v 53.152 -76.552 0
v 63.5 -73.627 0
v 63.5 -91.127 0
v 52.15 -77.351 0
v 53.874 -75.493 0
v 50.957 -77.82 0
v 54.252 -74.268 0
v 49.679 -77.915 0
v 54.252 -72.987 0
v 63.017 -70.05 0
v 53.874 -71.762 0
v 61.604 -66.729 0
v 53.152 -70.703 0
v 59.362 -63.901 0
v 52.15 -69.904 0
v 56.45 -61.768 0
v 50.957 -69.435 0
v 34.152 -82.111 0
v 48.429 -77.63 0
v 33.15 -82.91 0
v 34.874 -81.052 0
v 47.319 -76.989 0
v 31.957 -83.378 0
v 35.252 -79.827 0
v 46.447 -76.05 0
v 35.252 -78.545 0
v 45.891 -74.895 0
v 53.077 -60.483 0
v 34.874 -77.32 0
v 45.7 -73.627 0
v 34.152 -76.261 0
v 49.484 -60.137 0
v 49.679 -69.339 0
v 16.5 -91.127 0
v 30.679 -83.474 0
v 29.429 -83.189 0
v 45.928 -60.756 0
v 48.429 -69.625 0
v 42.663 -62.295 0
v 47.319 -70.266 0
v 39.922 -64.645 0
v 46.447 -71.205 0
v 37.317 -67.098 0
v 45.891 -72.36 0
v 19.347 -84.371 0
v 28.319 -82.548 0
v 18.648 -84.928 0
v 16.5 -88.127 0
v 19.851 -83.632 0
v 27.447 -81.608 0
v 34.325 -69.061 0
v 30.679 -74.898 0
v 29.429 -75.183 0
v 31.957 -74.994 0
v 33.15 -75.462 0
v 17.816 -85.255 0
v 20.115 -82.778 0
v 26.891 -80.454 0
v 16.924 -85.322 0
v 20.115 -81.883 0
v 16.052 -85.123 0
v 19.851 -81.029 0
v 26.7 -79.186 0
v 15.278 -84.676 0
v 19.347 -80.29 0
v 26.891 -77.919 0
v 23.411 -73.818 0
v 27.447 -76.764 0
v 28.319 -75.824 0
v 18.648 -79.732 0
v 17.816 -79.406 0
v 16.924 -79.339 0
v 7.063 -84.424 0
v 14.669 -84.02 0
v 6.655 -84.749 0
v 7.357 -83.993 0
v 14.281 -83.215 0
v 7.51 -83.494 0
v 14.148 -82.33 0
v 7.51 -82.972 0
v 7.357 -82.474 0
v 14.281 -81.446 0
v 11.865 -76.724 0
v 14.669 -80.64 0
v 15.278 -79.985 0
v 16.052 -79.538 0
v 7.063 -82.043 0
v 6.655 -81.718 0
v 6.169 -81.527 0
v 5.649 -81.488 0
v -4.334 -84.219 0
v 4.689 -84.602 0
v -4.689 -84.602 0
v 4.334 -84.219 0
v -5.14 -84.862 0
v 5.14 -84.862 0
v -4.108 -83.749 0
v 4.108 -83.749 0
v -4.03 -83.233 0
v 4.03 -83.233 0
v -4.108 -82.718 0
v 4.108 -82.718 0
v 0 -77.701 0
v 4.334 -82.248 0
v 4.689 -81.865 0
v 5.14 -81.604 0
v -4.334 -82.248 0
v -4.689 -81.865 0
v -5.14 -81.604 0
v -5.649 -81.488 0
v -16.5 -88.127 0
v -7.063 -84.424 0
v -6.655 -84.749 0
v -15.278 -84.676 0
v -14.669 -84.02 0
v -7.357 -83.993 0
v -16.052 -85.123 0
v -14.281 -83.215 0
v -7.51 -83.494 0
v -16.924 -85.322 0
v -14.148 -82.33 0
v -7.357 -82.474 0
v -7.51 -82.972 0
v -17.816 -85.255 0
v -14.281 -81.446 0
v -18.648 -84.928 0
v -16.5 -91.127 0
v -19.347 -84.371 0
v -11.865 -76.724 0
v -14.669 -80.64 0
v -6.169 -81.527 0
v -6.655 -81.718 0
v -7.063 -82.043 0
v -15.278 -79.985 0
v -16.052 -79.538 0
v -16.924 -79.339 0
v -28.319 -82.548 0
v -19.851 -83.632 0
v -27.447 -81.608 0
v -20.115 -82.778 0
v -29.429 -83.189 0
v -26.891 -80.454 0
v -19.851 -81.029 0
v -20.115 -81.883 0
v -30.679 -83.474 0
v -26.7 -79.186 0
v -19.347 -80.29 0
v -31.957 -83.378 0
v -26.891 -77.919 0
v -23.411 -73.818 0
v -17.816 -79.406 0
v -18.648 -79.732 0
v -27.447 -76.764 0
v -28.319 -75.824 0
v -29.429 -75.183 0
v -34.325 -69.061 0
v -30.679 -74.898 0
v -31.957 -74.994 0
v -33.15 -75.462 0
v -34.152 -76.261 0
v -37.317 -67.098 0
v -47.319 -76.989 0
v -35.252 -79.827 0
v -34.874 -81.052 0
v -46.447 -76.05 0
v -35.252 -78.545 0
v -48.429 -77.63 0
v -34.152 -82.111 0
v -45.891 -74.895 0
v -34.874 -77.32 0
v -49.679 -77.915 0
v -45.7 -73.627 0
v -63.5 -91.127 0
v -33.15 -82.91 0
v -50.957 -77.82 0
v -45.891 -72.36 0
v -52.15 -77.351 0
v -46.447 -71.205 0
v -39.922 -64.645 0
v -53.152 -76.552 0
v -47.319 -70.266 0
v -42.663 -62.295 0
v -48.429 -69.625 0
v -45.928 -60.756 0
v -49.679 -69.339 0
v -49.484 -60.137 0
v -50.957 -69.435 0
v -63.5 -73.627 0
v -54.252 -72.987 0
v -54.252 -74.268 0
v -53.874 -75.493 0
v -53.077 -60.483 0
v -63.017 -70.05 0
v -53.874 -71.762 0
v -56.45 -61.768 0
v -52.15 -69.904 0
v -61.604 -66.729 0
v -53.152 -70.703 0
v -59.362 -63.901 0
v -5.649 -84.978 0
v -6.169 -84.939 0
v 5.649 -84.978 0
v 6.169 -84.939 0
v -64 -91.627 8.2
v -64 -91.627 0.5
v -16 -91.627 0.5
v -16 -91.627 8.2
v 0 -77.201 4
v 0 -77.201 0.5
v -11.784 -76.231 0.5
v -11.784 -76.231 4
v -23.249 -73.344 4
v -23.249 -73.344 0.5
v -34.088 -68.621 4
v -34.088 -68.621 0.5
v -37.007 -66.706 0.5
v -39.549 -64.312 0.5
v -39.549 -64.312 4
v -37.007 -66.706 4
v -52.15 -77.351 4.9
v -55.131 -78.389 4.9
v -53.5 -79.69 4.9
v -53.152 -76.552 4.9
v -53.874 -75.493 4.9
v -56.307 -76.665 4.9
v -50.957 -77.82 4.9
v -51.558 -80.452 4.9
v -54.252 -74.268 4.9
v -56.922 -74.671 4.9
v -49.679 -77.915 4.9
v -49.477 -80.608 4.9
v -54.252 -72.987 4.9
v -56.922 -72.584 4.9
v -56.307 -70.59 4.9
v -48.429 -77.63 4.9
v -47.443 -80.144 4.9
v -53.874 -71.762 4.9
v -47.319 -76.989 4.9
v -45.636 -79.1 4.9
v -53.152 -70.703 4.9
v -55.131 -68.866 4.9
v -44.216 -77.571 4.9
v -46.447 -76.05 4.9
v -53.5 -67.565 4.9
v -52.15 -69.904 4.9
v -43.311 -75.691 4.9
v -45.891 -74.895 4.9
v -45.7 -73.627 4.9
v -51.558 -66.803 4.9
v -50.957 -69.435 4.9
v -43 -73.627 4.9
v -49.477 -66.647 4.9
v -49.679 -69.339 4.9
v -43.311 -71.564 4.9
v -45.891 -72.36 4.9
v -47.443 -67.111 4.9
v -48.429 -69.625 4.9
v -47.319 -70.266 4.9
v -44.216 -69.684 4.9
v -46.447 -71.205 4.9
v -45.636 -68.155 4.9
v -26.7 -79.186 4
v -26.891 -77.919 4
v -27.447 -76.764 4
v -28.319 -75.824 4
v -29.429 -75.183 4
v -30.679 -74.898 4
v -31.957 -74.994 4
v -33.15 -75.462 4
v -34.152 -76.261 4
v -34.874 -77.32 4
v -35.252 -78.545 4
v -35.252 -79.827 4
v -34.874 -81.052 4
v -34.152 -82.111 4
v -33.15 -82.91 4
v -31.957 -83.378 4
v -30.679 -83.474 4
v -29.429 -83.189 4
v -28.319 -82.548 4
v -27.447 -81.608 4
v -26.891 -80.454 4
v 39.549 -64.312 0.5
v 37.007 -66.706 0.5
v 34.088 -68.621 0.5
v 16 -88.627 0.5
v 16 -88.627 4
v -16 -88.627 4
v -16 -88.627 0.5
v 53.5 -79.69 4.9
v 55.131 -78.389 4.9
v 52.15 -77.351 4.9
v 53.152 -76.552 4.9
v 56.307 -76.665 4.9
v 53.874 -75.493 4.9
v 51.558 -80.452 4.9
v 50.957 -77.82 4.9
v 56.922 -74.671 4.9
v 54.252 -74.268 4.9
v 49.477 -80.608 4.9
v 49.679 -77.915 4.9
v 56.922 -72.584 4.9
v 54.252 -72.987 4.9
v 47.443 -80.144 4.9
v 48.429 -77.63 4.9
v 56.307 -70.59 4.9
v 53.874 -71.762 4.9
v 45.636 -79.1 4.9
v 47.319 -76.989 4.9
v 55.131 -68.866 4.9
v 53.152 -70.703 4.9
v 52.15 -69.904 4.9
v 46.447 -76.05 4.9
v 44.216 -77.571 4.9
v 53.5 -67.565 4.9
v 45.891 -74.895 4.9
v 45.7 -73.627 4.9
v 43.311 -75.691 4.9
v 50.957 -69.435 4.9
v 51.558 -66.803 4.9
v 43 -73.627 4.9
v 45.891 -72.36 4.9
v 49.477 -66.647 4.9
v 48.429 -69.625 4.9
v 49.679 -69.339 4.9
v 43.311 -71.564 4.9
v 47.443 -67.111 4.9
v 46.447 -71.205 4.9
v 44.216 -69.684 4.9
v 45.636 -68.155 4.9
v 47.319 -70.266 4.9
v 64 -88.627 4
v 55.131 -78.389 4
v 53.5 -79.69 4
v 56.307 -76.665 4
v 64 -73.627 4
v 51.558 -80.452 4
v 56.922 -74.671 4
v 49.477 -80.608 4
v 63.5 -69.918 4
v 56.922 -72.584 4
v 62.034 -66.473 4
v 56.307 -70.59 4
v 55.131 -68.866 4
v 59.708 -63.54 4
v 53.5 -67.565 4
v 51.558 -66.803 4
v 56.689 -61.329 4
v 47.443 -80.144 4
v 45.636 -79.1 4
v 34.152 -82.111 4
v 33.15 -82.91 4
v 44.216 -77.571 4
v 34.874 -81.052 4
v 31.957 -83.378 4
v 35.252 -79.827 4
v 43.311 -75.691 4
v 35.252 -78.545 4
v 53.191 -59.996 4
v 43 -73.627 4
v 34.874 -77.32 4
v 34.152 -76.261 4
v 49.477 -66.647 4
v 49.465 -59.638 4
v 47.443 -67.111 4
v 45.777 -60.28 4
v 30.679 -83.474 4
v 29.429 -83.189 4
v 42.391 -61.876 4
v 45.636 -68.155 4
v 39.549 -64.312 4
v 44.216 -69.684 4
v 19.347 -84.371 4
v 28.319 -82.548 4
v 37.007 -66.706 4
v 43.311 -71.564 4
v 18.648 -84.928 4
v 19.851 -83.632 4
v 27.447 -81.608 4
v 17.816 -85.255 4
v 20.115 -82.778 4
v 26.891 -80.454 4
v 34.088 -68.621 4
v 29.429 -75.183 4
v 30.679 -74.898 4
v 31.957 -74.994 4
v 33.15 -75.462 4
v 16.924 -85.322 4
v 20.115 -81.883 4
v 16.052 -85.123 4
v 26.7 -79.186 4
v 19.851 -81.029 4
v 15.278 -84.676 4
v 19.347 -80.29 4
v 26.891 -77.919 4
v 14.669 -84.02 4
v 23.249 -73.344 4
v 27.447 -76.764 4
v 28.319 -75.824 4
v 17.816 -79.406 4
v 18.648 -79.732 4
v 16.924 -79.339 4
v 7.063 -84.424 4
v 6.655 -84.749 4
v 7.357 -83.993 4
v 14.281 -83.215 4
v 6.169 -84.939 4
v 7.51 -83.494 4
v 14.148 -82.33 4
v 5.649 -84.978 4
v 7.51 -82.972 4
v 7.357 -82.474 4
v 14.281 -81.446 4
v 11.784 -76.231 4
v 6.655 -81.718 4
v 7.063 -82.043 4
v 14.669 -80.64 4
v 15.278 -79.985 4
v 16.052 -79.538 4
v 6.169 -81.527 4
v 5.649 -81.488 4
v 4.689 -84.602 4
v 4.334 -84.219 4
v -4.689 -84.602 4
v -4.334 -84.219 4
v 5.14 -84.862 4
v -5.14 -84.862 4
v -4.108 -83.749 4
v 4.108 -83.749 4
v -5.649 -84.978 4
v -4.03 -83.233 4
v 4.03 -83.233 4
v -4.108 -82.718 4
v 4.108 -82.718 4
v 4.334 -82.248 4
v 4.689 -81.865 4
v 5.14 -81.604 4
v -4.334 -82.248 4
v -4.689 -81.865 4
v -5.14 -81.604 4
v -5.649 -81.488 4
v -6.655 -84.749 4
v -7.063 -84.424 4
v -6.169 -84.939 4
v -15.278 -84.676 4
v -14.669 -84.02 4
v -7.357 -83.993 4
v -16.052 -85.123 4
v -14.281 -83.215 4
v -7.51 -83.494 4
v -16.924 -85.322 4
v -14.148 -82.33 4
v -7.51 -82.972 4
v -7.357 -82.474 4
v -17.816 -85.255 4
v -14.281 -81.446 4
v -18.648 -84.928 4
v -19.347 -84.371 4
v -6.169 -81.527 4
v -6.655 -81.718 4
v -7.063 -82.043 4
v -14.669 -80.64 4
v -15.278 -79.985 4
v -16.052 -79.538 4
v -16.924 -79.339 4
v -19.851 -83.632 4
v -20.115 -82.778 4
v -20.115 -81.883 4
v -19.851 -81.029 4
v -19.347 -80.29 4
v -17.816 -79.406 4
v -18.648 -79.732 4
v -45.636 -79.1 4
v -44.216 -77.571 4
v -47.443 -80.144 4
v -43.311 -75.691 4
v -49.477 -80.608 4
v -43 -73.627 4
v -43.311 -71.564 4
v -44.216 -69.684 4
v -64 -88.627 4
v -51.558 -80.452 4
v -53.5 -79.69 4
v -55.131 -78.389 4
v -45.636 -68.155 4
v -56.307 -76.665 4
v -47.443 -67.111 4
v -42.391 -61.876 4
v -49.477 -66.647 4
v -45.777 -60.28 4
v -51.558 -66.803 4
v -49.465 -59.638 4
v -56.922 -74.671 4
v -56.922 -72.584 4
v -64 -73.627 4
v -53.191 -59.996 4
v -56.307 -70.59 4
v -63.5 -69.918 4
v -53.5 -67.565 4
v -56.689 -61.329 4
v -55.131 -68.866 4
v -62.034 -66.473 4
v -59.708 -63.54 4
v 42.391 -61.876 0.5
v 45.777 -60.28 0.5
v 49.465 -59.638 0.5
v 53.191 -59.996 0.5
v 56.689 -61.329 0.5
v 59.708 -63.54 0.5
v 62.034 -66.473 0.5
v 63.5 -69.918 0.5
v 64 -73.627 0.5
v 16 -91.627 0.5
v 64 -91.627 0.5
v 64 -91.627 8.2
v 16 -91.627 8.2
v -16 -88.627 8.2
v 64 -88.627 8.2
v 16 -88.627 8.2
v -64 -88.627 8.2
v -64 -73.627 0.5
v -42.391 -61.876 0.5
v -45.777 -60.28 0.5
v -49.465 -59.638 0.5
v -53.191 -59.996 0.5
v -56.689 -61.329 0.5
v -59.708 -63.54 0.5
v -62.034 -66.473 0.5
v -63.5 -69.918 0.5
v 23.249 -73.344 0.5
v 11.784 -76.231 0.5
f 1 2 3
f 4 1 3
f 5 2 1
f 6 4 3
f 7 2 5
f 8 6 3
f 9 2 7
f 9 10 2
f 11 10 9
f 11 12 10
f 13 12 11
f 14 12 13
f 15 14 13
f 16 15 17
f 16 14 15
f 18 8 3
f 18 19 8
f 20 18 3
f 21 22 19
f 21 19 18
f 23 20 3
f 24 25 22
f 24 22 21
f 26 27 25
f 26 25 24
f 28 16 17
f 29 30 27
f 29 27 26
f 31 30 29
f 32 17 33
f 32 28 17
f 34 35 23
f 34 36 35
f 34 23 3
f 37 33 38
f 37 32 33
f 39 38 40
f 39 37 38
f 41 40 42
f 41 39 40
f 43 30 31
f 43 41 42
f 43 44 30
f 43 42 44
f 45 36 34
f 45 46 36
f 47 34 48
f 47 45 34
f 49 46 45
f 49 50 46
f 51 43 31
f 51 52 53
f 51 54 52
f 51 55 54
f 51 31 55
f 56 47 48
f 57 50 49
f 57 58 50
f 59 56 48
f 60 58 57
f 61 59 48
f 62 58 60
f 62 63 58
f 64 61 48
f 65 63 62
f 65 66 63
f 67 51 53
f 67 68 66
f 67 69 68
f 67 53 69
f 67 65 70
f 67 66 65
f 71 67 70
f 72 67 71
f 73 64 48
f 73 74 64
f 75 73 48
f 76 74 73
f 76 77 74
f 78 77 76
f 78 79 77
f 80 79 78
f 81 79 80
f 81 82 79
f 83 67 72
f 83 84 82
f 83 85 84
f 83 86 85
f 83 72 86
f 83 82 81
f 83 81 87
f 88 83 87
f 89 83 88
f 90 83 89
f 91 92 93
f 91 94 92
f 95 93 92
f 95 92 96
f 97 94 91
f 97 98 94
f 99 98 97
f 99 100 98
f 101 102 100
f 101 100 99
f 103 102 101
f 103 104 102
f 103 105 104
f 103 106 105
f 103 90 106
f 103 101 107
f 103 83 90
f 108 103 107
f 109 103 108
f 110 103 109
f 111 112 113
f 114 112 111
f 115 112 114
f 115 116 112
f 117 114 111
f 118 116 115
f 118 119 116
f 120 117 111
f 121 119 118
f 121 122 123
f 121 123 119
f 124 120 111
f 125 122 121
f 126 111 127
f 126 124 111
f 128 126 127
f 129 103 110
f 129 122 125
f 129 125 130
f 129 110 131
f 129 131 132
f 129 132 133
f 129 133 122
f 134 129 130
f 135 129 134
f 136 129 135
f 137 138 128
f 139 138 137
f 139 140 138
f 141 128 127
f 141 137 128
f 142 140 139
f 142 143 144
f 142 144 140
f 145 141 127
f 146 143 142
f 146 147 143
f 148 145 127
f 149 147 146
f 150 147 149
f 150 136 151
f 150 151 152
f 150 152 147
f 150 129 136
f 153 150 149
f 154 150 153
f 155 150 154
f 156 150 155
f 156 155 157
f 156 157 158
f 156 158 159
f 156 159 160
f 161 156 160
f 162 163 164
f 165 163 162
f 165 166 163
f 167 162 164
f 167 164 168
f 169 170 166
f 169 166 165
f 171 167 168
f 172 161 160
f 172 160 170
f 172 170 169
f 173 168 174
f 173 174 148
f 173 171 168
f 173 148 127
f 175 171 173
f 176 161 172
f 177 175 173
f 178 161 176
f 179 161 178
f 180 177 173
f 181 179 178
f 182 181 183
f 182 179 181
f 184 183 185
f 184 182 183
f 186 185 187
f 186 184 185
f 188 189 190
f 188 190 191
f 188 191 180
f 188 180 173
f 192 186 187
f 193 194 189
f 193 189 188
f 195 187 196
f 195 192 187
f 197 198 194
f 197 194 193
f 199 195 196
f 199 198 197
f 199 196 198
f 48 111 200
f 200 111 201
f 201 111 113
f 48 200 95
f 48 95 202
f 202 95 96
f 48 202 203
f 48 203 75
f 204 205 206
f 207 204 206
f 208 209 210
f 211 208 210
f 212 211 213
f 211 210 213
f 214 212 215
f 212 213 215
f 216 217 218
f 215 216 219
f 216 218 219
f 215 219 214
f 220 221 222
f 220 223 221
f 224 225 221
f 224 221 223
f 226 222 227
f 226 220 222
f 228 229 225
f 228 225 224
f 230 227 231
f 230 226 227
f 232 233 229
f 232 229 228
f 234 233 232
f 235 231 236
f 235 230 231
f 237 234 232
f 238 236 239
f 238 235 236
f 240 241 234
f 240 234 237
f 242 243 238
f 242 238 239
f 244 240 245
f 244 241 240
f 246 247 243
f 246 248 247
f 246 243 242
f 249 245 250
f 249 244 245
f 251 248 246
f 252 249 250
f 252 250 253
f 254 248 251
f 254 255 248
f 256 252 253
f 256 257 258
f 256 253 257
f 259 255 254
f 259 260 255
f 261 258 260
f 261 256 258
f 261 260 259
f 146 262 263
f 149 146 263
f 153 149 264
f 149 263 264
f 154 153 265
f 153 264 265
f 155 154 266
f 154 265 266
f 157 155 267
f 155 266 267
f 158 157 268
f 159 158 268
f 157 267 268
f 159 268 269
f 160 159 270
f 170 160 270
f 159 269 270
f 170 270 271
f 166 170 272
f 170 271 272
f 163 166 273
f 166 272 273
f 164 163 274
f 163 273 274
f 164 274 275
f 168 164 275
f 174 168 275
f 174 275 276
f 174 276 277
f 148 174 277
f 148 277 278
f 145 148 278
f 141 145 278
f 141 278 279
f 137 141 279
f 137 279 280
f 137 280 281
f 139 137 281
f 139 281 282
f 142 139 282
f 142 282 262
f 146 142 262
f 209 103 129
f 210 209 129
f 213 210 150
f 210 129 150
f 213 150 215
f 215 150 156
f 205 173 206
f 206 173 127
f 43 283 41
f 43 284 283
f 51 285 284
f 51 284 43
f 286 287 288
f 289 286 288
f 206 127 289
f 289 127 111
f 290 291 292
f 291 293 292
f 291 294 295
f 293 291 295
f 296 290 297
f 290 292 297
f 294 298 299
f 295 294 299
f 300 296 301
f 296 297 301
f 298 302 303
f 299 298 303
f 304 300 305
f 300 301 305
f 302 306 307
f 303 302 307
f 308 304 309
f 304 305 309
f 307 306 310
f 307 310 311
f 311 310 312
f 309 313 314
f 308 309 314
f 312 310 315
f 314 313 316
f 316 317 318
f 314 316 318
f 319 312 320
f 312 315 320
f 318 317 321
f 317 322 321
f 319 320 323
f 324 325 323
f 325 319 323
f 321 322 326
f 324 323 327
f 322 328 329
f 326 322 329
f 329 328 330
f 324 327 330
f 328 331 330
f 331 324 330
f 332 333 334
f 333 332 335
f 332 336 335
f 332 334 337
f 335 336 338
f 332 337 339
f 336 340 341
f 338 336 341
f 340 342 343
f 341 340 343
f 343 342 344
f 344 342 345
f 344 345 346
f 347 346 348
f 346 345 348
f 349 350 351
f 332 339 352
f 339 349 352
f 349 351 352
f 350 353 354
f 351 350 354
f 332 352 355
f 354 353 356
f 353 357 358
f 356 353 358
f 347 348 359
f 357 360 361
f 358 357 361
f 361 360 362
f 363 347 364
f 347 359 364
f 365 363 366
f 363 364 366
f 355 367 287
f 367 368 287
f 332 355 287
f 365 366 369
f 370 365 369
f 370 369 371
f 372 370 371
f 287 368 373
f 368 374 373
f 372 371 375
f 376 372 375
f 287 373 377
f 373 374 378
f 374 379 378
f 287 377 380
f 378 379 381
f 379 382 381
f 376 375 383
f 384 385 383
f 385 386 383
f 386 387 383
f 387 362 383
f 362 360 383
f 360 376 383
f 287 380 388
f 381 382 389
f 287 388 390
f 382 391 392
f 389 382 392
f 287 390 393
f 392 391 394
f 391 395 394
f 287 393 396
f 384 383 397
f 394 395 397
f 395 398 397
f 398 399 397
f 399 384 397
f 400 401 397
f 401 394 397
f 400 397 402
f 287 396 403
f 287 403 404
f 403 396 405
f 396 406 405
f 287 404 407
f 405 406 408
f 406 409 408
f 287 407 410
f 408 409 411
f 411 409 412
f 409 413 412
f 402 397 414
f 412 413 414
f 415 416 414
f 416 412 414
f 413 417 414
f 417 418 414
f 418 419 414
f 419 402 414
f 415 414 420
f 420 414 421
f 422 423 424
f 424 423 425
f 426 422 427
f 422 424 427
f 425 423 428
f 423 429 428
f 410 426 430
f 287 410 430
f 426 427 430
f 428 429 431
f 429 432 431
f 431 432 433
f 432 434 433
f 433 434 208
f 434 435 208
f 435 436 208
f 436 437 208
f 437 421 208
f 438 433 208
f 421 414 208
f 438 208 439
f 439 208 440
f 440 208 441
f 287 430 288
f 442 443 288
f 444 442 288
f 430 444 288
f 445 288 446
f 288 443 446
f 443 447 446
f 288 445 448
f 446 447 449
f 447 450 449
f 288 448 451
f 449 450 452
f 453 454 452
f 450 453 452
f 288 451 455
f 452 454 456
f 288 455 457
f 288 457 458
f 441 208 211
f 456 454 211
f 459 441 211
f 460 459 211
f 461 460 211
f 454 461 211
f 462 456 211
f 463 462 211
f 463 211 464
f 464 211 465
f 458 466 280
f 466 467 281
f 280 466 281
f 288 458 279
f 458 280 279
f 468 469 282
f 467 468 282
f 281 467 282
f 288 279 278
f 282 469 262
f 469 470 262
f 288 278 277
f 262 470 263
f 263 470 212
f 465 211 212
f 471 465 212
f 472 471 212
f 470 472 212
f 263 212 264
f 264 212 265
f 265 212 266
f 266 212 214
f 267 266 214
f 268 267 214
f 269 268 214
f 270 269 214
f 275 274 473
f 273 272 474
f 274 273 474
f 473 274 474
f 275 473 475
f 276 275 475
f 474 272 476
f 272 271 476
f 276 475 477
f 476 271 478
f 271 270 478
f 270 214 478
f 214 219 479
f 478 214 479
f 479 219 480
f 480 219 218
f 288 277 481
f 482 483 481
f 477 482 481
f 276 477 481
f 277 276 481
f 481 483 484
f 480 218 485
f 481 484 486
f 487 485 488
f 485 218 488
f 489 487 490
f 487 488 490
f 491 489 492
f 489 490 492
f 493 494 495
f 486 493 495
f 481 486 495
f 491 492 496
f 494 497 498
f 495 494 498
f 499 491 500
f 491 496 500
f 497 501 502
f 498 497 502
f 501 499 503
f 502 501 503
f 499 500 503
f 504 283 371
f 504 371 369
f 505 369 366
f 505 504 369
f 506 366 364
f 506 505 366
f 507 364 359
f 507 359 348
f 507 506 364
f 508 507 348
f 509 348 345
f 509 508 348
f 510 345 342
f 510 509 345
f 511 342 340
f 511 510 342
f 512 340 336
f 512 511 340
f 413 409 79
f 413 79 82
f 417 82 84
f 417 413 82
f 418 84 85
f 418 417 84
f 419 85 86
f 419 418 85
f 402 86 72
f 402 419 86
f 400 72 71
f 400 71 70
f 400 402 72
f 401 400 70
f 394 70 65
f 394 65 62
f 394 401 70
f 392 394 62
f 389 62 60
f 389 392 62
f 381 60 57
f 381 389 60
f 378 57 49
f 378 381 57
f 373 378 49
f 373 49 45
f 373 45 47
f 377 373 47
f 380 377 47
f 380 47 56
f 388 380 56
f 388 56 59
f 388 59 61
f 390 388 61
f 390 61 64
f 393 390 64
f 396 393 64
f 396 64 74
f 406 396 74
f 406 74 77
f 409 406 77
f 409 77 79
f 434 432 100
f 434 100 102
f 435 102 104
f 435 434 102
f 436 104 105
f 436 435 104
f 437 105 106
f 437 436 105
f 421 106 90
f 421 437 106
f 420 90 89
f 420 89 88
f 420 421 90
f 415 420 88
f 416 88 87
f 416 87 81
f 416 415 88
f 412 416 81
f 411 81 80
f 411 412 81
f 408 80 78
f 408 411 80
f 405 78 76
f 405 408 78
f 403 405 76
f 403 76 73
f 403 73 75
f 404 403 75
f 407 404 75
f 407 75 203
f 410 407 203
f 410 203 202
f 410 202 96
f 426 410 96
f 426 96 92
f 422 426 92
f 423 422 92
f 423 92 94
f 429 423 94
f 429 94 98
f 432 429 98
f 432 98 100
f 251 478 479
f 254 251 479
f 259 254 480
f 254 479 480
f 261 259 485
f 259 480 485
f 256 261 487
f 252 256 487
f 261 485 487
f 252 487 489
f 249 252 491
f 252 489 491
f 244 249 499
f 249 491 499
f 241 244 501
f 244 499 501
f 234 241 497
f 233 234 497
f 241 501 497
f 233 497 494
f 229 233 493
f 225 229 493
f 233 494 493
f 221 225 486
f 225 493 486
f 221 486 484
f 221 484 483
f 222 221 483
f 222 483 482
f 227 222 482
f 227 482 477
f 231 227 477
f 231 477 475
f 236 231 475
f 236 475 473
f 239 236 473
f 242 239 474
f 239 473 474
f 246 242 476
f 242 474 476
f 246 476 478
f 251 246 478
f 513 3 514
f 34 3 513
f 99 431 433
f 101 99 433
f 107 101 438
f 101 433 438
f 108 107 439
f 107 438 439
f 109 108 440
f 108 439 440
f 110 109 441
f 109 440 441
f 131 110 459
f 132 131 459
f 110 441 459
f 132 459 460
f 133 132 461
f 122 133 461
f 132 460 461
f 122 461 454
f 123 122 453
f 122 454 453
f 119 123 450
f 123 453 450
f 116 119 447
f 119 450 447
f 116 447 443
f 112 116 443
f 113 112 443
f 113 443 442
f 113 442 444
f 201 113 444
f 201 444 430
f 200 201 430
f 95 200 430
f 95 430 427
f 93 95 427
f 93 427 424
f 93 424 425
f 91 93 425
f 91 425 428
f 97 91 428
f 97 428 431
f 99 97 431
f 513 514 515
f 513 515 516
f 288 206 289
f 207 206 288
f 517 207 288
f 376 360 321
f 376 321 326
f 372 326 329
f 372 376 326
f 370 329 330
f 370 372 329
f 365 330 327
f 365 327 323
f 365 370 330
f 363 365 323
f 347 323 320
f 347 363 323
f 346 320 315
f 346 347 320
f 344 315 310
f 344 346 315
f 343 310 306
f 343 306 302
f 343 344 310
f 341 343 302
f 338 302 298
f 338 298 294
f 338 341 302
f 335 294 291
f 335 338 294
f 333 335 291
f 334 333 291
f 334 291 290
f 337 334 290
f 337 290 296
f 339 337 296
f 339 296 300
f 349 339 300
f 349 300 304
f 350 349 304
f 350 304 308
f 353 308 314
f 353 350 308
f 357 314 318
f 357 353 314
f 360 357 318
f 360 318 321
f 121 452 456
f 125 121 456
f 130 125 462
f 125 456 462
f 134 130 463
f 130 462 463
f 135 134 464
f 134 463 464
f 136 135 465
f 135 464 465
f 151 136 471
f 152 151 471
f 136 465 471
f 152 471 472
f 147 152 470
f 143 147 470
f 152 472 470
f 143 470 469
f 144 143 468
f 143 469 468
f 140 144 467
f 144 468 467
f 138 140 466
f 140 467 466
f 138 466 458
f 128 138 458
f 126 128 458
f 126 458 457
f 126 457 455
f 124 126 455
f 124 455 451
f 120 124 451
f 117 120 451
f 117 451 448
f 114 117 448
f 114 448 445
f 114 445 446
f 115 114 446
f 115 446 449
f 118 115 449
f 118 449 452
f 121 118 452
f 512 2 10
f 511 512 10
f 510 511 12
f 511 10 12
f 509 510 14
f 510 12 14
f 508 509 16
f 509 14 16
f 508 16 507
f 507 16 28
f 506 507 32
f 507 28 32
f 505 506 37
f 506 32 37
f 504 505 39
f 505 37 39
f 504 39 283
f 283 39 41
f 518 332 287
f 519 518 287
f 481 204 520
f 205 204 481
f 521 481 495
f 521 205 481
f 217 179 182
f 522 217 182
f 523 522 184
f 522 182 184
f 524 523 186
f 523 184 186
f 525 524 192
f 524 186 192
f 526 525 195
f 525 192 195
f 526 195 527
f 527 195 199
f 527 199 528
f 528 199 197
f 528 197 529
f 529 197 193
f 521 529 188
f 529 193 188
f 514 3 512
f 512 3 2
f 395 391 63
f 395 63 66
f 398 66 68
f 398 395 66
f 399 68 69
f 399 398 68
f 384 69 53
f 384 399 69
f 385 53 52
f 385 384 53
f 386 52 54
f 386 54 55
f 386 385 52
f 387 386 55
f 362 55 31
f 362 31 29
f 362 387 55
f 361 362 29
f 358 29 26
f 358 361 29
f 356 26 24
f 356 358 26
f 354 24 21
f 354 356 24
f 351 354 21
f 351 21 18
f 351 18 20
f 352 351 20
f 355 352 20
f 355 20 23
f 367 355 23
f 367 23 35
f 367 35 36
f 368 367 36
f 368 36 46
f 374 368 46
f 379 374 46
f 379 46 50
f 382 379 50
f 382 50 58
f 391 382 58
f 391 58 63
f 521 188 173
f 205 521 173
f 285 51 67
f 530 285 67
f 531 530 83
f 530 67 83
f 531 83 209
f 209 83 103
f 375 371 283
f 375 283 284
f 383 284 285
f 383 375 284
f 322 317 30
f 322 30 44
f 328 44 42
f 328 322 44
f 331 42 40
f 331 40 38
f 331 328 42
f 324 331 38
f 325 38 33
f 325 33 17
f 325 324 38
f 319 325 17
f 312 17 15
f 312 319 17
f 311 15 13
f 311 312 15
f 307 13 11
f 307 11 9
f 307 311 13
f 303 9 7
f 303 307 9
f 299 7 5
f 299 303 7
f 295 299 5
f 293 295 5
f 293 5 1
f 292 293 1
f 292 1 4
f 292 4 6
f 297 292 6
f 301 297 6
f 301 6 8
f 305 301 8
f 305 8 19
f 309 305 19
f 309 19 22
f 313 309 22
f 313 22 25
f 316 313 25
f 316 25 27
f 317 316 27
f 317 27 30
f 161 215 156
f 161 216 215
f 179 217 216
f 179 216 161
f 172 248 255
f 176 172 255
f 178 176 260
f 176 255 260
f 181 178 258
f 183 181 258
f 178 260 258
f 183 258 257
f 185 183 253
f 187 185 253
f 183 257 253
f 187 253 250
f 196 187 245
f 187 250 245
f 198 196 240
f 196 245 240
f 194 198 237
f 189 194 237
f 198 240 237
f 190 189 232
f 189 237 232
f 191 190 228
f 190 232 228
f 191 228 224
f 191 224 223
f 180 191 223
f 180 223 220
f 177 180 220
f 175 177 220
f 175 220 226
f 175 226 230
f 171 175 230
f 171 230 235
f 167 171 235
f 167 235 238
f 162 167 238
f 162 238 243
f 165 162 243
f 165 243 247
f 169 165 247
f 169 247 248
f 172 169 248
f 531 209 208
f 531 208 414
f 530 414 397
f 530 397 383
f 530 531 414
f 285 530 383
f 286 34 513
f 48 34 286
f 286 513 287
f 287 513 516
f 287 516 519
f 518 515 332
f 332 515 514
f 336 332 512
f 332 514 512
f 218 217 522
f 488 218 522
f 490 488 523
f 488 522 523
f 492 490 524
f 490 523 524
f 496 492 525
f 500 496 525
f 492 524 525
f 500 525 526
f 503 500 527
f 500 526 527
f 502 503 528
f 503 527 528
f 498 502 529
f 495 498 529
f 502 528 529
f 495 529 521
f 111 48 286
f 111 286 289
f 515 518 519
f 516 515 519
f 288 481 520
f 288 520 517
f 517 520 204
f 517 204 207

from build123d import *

# Parameters (mm, degrees)
BOSS_EXTRUDE1_DEPTH = 4
SKETCH6_R           = 7
BOSS_EXTRUDE2_DEPTH = 0.9
SKETCH7_R           = 4.3
CUT_EXTRUDE1_DEPTH  = 20
FILLET1_R           = 20
SKETCH8_W           = 64
SKETCH8_H           = 3
BOSS_EXTRUDE3_DEPTH = 4.2
SKETCH10_W          = 16
SKETCH10_H          = 3
CUT_EXTRUDE2_DEPTH  = 20
SKETCH11_R          = 4.3
SKETCH11_R_2        = 3
SKETCH11_R_3        = 1.75
CUT_EXTRUDE3_DEPTH  = 20
CHAMFER1_SIZE       = 0.5


with BuildPart() as part:
    # Sketch3 → Boss-Extrude1 (new body)
    with BuildSketch(Plane.XY):
        with BuildLine():
            Line((-64, -73.627440537), (-64, -91.627440537))
            Line((-64, -91.627440537), (0, -91.627440537))
            Line((0, -91.627440537), (0, -77.201334505))
            ThreePointArc((0, -77.201334505), (-19.791335437, -74.427796509), (-38.057892518, -66.320863438))
            ThreePointArc((-38.057892518, -66.320863438), (-53.795424565, -60.15173082), (-64, -73.627440537))
        make_face()
    extrude(amount=BOSS_EXTRUDE1_DEPTH)

    # Sketch6 → Boss-Extrude2 (add)
    with BuildSketch(Plane.XY.offset(4)):
        with Locations((-50, -73.627440537)):
            Circle(SKETCH6_R)
    extrude(amount=BOSS_EXTRUDE2_DEPTH)

    # Sketch7 → Cut-Extrude1 (cut)
    with BuildSketch(Plane.XY.offset(4.9)):
        with Locations((-50, -73.627440537)):
            Circle(SKETCH7_R)
    extrude(amount=-CUT_EXTRUDE1_DEPTH, mode=Mode.SUBTRACT)

    # Fillet1
    fillet1_edges = [part.edges().sort_by_distance(p)[0] for p in [
        (-38.057892518, -66.320863438, 2),
    ]]
    fillet(fillet1_edges, radius=FILLET1_R)

    # Sketch8 → Boss-Extrude3 (add)
    with BuildSketch(Plane.XY.offset(4)):
        with Locations((-32, -90.127440537)):
            Rectangle(SKETCH8_W, SKETCH8_H)
    extrude(amount=BOSS_EXTRUDE3_DEPTH)

    # Sketch10 → Cut-Extrude2 (cut)
    with BuildSketch(Plane.XY.offset(8.2)):
        with Locations((-8, -90.127440537)):
            Rectangle(SKETCH10_W, SKETCH10_H)
    extrude(amount=-CUT_EXTRUDE2_DEPTH, mode=Mode.SUBTRACT)

    # Sketch11 → Cut-Extrude3 (cut)
    with BuildSketch(Plane.XY.offset(4)):
        with Locations((-31, -79.186135246)):
            Circle(SKETCH11_R)
        with Locations((-17.14802046, -82.330394565)):
            Circle(SKETCH11_R_2)
        with Locations((-5.779829741, -83.233322768)):
            Circle(SKETCH11_R_3)
    extrude(amount=-CUT_EXTRUDE3_DEPTH, mode=Mode.SUBTRACT)

    # Mirror1: part across plane


with BuildPart() as part_1:
    add(part.part)
    add(part.part.mirror(Plane(origin=(0, -91.627440537, 4), x_dir=(0, 0, 1), z_dir=(-1, 0, 0))))

    # Chamfer1
    chamfer1_edges = [part_1.edges().sort_by_distance(p)[0] for p in [
        (-54.98433008, -60.544762919, 0),
        (0, -77.201334505, 0),
        (-37.007349735, -66.705508667, 0),
        (0, -88.627440537, 0),
        (-16, -90.127440537, 0),
        (-40, -91.627440537, 0),
        (-64, -82.627440537, 0),
        (54.98433008, -60.544762919, 0),
        (64, -82.627440537, 0),
        (40, -91.627440537, 0),
        (37.007349735, -66.705508667, 0),
        (16, -90.127440537, 0),
    ]]
    chamfer(chamfer1_edges, length=CHAMFER1_SIZE)


solid = part_1.part
